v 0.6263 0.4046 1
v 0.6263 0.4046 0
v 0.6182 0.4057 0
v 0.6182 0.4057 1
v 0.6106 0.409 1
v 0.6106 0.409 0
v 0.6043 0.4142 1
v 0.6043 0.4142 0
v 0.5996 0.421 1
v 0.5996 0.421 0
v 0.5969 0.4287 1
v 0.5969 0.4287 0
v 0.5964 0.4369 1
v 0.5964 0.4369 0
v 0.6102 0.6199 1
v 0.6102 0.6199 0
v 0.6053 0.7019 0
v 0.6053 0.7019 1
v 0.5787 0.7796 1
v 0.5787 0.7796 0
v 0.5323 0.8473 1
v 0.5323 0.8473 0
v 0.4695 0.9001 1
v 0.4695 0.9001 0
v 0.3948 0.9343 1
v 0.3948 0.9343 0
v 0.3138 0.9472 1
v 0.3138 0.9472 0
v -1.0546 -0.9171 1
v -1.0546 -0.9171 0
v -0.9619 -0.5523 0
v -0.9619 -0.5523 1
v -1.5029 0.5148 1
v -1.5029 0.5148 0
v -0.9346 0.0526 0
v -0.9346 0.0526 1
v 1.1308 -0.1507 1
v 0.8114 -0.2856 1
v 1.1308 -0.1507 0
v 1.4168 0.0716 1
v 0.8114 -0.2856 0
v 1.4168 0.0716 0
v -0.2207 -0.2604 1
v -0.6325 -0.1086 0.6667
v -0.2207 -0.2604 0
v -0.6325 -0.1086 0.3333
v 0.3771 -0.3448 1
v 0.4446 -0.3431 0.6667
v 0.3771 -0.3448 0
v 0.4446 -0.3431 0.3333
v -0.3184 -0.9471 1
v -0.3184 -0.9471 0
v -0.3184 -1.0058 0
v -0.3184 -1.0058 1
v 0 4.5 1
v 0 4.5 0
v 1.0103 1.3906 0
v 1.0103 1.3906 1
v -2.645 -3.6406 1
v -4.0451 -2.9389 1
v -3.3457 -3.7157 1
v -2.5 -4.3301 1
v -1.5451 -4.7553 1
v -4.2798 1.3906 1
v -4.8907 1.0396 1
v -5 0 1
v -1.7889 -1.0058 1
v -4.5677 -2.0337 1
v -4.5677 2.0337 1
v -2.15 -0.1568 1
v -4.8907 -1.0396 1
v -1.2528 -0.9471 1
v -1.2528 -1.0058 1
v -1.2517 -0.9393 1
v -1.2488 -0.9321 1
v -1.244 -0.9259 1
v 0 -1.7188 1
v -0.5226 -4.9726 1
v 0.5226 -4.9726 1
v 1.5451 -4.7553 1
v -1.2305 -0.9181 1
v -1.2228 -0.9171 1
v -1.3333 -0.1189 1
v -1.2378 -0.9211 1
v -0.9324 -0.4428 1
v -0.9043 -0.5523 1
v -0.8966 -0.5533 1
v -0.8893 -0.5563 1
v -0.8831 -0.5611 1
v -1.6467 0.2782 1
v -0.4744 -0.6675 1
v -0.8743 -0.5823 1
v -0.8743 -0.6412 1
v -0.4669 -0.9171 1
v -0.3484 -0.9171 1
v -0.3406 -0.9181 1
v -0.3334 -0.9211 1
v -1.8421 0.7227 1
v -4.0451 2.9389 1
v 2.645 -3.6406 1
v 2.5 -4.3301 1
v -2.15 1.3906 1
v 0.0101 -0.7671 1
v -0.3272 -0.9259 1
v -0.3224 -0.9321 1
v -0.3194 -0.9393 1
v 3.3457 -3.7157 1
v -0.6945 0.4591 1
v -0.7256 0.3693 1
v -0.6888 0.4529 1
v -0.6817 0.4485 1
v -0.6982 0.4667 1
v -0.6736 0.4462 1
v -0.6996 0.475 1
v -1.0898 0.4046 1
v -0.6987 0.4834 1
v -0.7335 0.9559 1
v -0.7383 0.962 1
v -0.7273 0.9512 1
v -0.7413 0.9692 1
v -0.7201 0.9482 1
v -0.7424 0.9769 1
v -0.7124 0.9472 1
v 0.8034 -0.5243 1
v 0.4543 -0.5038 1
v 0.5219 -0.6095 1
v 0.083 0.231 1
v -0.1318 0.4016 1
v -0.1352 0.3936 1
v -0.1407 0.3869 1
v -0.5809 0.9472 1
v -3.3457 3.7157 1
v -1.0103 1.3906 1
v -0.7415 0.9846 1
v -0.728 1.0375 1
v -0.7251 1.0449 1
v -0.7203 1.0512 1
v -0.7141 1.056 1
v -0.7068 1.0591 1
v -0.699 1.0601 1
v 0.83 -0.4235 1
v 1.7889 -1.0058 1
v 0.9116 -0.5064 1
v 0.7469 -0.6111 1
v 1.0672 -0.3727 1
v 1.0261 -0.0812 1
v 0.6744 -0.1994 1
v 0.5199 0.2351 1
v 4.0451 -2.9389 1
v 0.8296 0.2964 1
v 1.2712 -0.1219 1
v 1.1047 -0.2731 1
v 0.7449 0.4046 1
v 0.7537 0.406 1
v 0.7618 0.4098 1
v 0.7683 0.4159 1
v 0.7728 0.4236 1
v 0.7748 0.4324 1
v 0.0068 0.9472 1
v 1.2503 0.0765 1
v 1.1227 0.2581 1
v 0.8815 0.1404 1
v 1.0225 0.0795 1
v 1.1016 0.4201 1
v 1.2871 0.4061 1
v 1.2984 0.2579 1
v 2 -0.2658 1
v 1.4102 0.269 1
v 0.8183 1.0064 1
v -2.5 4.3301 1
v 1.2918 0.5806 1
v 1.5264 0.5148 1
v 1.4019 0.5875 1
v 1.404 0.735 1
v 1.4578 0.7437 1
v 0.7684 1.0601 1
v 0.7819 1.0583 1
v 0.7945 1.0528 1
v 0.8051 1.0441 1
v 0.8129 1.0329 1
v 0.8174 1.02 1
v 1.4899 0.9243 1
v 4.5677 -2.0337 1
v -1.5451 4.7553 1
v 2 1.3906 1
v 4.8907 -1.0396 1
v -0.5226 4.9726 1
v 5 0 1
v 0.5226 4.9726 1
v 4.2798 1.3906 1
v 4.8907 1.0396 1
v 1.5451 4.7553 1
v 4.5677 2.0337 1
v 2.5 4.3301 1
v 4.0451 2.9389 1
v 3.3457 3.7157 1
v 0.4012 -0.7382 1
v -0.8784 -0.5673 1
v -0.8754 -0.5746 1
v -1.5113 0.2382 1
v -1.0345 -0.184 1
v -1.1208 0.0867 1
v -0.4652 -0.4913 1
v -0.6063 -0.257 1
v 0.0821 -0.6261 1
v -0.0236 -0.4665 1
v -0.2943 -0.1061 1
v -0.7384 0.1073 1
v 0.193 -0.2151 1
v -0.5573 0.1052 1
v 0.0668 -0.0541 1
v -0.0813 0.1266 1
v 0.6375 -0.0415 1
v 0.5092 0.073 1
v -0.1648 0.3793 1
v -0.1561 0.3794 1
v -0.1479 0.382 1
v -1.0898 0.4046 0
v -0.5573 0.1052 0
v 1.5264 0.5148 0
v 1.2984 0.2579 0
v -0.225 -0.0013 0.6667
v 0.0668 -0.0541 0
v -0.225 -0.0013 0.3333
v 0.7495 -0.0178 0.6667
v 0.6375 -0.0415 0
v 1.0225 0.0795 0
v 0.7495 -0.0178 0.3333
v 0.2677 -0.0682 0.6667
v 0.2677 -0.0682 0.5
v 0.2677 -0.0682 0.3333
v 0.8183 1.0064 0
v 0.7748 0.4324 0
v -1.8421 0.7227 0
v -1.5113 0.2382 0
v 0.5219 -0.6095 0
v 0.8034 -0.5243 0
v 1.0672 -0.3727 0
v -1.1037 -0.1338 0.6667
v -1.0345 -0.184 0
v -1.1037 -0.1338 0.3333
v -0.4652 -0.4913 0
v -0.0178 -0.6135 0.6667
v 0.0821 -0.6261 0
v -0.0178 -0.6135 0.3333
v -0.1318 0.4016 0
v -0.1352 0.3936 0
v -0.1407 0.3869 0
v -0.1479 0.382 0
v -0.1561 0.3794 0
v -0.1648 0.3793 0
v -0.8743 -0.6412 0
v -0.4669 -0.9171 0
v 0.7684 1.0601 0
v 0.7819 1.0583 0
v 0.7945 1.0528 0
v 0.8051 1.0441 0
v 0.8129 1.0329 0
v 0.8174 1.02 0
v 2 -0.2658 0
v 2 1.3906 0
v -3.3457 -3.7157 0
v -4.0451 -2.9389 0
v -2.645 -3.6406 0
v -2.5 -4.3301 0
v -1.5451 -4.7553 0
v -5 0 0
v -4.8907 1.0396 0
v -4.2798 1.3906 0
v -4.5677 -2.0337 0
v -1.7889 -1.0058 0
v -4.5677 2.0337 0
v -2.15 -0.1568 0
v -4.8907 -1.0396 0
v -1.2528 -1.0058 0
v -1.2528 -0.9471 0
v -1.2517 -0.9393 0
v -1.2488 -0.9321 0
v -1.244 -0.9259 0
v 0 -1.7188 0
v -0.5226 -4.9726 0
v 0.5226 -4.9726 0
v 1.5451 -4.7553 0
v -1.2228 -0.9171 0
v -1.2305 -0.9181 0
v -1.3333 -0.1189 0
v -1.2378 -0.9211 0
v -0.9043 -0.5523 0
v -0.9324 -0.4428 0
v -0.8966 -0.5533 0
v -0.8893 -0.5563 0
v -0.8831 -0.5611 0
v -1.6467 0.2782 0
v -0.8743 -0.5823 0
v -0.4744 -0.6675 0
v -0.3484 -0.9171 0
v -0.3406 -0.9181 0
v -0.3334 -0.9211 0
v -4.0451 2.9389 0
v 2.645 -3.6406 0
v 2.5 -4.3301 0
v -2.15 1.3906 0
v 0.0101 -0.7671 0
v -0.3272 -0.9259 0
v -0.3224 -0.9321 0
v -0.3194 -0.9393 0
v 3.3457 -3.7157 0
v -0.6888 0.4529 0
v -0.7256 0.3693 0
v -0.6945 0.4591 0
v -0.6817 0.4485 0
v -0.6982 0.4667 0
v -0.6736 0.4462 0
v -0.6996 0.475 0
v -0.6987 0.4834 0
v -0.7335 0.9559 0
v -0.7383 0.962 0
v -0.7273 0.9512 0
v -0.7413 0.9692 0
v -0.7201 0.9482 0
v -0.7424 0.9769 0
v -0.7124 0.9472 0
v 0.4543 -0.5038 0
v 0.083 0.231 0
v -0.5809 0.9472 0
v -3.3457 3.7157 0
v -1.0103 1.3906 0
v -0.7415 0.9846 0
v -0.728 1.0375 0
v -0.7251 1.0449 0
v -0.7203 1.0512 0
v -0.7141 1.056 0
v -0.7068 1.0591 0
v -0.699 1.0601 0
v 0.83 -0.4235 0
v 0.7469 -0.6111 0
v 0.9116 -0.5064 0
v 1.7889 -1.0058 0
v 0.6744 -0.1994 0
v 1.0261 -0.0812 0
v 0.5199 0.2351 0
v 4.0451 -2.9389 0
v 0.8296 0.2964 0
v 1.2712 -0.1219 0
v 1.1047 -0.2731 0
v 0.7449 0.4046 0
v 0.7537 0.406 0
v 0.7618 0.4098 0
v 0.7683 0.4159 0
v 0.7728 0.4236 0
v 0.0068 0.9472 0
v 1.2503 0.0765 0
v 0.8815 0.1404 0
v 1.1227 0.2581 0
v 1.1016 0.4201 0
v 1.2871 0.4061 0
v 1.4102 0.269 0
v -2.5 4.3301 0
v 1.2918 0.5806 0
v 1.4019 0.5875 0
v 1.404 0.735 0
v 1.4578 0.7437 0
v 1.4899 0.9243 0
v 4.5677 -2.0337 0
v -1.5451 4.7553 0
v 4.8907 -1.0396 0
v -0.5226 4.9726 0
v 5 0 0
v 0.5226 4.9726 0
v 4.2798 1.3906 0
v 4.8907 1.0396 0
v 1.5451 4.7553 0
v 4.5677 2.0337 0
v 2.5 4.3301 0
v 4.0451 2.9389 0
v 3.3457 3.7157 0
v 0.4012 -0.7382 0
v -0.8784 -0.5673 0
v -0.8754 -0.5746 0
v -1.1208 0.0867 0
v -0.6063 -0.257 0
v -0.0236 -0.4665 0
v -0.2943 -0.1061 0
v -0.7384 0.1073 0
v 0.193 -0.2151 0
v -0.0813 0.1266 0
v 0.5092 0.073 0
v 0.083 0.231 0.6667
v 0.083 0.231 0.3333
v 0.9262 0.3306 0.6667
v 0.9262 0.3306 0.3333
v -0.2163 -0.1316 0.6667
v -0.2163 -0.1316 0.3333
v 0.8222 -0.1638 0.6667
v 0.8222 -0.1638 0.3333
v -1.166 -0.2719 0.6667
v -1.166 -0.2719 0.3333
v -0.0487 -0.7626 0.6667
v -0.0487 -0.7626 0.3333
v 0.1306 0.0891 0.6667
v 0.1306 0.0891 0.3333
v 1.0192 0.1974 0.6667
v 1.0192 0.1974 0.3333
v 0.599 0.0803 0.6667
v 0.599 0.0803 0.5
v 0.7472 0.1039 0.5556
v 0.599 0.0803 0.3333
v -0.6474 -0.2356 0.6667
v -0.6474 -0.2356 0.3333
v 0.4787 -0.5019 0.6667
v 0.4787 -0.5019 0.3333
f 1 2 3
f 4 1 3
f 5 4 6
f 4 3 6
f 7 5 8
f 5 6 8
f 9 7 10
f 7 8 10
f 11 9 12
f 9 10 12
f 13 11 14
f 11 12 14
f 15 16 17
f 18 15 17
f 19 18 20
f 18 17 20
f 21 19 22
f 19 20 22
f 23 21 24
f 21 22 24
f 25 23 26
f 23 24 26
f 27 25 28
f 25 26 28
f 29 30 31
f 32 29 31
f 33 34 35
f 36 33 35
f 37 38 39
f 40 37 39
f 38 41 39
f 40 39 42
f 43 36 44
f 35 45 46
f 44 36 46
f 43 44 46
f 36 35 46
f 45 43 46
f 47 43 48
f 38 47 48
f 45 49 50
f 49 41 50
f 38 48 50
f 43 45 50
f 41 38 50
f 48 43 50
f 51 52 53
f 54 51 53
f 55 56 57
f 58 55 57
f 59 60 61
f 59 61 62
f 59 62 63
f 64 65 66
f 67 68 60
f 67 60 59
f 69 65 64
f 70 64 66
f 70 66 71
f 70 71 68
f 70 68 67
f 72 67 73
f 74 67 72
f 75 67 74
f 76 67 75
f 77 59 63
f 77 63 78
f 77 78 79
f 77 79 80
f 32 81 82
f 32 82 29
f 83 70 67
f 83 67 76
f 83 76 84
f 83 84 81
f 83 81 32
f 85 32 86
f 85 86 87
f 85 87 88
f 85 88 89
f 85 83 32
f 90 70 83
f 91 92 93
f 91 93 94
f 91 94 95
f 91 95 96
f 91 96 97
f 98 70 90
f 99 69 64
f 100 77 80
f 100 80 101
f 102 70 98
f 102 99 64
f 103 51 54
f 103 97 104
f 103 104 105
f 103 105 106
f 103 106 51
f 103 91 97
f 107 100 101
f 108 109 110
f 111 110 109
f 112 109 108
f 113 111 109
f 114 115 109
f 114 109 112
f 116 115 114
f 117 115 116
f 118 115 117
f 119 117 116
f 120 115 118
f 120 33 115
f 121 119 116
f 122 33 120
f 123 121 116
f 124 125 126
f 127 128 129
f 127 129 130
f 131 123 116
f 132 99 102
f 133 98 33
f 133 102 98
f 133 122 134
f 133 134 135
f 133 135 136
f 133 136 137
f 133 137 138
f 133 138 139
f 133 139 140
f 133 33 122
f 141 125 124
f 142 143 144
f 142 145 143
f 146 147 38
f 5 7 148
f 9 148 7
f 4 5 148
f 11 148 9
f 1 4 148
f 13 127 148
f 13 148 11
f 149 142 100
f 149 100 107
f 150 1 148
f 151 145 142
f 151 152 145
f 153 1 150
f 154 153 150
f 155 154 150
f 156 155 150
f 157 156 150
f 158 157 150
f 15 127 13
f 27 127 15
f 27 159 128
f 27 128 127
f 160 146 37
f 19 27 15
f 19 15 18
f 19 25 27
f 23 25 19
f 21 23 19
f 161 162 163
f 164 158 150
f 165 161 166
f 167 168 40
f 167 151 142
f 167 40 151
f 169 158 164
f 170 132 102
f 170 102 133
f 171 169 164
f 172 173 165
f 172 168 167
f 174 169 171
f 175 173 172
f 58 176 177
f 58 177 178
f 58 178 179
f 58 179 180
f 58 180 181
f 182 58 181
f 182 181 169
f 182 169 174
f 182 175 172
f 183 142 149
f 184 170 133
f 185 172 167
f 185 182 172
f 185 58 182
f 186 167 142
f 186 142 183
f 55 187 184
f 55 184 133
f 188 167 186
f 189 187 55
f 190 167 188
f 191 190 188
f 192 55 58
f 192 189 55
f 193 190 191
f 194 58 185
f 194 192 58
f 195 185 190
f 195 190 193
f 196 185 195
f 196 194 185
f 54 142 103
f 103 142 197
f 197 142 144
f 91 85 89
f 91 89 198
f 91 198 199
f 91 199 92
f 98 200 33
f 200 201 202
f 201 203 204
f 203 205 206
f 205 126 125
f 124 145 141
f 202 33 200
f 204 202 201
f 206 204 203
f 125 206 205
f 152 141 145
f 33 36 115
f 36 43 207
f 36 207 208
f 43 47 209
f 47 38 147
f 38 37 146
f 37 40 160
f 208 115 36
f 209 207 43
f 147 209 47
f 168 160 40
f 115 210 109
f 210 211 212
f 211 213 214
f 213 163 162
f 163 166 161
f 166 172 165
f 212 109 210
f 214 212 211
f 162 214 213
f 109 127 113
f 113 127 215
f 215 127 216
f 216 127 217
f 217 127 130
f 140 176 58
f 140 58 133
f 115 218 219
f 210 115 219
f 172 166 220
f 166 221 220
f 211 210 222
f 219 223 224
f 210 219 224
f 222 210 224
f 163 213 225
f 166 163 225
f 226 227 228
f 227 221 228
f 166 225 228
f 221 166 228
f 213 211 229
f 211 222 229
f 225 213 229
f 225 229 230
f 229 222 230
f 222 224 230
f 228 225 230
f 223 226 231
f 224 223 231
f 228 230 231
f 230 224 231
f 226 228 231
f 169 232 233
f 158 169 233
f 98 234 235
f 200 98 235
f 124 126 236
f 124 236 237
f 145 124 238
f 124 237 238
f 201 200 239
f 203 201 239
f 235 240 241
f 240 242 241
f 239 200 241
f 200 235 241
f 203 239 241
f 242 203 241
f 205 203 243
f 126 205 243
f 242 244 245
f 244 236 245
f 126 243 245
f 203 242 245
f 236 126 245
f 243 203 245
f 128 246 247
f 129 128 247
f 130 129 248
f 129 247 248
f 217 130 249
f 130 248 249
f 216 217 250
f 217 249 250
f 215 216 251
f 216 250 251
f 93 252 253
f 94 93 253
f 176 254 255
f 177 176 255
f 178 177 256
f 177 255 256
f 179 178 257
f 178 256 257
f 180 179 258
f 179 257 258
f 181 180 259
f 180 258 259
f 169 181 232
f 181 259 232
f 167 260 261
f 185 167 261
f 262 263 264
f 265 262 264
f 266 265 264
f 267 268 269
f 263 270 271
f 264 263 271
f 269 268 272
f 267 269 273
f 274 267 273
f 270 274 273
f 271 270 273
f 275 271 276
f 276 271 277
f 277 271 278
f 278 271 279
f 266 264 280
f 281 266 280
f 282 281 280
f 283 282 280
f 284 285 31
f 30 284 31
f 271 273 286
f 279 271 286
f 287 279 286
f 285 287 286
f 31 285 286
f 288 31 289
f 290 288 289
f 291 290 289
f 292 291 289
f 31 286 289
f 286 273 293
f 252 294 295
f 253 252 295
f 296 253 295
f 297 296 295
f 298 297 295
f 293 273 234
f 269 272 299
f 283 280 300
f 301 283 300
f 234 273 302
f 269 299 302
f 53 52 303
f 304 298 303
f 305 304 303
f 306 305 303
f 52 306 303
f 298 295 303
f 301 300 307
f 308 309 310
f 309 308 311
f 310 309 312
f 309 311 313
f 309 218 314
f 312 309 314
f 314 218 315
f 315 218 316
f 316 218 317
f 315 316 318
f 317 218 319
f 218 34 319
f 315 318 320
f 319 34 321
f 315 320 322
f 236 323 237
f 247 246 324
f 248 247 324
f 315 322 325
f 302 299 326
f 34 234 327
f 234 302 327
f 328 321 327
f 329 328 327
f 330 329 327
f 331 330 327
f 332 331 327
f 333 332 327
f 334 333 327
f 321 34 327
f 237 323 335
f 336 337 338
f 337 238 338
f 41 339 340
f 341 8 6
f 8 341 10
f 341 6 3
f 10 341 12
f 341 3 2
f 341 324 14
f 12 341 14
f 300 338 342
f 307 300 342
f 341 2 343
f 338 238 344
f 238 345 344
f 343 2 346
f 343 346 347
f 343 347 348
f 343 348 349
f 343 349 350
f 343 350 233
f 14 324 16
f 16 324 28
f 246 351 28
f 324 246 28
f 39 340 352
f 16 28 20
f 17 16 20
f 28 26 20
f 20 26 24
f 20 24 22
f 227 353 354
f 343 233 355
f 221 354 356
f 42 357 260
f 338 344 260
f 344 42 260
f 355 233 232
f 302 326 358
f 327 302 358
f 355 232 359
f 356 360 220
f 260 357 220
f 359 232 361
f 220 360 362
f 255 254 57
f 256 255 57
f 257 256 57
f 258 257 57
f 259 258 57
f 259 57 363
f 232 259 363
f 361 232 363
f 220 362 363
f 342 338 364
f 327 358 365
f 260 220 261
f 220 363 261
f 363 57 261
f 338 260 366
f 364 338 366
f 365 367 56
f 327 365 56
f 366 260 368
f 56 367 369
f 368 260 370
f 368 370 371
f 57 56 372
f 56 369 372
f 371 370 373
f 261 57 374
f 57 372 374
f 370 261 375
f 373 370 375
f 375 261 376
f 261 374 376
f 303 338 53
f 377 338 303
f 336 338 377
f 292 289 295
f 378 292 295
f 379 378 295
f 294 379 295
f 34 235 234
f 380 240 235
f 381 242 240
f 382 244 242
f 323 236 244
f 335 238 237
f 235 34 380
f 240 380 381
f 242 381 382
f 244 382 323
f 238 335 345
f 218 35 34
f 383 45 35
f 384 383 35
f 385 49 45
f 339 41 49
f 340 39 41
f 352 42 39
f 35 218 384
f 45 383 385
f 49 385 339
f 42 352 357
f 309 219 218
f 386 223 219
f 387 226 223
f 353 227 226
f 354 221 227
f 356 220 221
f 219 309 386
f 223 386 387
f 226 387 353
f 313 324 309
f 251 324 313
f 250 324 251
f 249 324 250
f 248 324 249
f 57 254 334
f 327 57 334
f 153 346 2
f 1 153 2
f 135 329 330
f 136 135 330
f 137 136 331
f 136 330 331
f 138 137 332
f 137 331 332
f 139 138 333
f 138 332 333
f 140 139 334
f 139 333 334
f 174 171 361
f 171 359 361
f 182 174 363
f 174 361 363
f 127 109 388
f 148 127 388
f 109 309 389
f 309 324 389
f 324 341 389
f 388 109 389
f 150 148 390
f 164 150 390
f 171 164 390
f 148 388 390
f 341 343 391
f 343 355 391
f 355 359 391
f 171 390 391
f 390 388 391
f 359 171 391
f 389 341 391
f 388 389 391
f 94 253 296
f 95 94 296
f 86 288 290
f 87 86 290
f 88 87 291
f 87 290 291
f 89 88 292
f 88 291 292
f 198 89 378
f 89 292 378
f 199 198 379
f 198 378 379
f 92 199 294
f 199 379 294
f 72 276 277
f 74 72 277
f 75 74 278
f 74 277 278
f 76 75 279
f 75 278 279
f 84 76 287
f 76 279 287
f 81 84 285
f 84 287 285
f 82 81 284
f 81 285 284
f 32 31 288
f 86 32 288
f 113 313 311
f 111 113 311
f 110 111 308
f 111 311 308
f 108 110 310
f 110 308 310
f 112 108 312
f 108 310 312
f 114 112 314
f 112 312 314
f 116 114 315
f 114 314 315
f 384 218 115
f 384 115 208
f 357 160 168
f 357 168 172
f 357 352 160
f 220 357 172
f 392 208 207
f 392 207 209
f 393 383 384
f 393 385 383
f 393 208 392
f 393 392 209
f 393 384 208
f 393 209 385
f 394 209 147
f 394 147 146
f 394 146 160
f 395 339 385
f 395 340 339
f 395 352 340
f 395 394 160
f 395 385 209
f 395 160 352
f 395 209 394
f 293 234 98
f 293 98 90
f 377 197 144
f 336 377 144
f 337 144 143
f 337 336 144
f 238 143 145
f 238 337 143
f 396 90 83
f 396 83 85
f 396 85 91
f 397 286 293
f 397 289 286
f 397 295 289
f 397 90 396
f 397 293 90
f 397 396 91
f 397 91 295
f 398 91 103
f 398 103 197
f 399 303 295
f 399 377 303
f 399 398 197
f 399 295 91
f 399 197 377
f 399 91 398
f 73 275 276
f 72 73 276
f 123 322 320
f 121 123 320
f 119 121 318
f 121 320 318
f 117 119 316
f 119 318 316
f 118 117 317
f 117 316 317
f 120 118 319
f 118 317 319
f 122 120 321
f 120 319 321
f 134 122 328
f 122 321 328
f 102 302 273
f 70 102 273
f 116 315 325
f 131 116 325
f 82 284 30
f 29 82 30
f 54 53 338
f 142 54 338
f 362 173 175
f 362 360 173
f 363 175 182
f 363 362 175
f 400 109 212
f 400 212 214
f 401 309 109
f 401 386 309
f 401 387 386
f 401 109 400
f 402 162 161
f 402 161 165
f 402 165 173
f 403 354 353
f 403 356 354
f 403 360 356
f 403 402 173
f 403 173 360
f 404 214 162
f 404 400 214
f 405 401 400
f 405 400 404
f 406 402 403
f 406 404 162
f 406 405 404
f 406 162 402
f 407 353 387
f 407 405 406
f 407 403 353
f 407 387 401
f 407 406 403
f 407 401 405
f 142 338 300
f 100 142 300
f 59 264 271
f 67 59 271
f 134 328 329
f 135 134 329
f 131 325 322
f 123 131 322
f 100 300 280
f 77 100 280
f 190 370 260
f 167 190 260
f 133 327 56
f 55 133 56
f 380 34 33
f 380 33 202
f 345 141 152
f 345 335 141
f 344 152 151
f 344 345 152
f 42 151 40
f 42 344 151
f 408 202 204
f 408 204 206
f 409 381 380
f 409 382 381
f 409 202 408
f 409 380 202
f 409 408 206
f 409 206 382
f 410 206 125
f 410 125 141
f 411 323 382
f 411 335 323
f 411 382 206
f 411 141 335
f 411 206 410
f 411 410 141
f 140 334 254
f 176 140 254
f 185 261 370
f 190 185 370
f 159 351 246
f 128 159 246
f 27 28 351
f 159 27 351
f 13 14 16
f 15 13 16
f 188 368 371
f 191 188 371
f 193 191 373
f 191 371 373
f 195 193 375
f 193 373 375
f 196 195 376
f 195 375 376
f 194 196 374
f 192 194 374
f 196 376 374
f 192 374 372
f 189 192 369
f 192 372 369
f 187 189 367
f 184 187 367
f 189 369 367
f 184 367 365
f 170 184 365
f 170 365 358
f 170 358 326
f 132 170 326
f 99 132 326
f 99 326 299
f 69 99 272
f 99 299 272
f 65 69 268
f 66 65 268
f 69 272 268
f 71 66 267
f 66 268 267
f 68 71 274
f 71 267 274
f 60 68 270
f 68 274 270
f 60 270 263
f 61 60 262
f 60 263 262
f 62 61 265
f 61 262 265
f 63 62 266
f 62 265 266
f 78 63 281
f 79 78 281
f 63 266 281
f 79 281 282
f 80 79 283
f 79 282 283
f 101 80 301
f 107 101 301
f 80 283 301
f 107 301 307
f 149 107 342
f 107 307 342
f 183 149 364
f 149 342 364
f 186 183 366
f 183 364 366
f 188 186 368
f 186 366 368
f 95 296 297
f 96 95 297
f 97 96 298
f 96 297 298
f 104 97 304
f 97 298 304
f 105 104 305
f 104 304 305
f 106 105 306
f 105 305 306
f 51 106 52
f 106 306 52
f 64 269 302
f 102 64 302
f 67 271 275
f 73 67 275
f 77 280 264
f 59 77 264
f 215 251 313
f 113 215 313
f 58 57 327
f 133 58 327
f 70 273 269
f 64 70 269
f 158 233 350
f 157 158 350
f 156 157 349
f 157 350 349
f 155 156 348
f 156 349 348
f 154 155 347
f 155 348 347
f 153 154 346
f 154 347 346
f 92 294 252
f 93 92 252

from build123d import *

# Parameters (mm, degrees)
SKETCH_1_R      = 5
EXTRUDE_1_DEPTH = 1


with BuildPart() as part:
    # 草图1 → 凸台-拉伸1 (new body)
    with BuildSketch(Plane.XY):
        Circle(SKETCH_1_R)
        with BuildLine():
            Line((-0.318380039, -1.005793851), (1.720384349, -1.005793851))
            Line((1.720384349, -1.005793851), (1.788940866, -1.005793851))
            Line((1.788940866, -1.005793851), (2.645033635, -3.640576475))
            Line((2.645033635, -3.640576475), (0, -1.718847051))
            Line((0, -1.718847051), (-2.645033635, -3.640576475))
            Line((-2.645033635, -3.640576475), (-1.788940866, -1.005793851))
            Line((-1.788940866, -1.005793851), (-1.252770646, -1.005793851))
            Line((-1.252770646, -1.005793851), (-1.252770646, -0.94707964))
            ThreePointArc((-1.252770646, -0.94707964), (-1.24398385, -0.925866437), (-1.222770646, -0.91707964))
            Line((-1.222770646, -0.91707964), (-1.054612311, -0.91707964))
            Line((-1.054612311, -0.91707964), (-0.9619207, -0.552326205))
            Line((-0.9619207, -0.552326205), (-0.904349803, -0.552326205))
            ThreePointArc((-0.904349803, -0.552326205), (-0.8831366, -0.561113001), (-0.874349803, -0.582326205))
            Line((-0.874349803, -0.582326205), (-0.874349803, -0.641189165))
            Line((-0.874349803, -0.641189165), (-0.466949327, -0.91707964))
            Line((-0.466949327, -0.91707964), (-0.348380039, -0.91707964))
            ThreePointArc((-0.348380039, -0.91707964), (-0.327166836, -0.925866437), (-0.318380039, -0.94707964))
            Line((-0.318380039, -0.94707964), (-0.318380039, -1.005793851))
        make_face(mode=Mode.SUBTRACT)
        with BuildLine():
            add(Edge.make_bspline(
                [(-1.842127605, 0.722748563), (-1.53406941, -0.398381027), (0.099478664, -1.328305568), (1.067230007, -0.372749727)],
                knots=[0, 0, 0, 0, 1, 1, 1, 1], degree=3))
            add(Edge.make_bspline(
                [(-1.842127605, 0.722748563), (-1.393572664, -0.207863674), (0.098677528, -1.088124965), (1.067230007, -0.372749727)],
                knots=[0, 0, 0, 0, 1, 1, 1, 1], degree=3))
        make_face(mode=Mode.SUBTRACT)
        with BuildLine():
            add(Edge.make_bspline(
                [(-1.502914254, 0.514806758), (-0.935681631, -0.359051857), (0.725669726, -1.040375739), (1.416769627, 0.071599659)],
                knots=[0, 0, 0, 0, 1, 1, 1, 1], degree=3))
            add(Edge.make_bspline(
                [(-1.502914254, 0.514806758), (-0.839650751, -0.216239781), (0.600989178, -0.75455265), (1.416769627, 0.071599659)],
                knots=[0, 0, 0, 0, 1, 1, 1, 1], degree=3))
        make_face(mode=Mode.SUBTRACT)
        with BuildLine():
            add(Edge.make_bspline(
                [(-1.089784914, 0.404626073), (-0.465343338, -0.314626601), (1.155887368, -0.588128356), (1.526429115, 0.514806758)],
                knots=[0, 0, 0, 0, 1, 1, 1, 1], degree=3))
            add(Edge.make_bspline(
                [(-1.089784914, 0.404626073), (-0.382266231, -0.142810276), (0.950686118, -0.345522278), (1.526429115, 0.514806758)],
                knots=[0, 0, 0, 0, 1, 1, 1, 1], degree=3))
        make_face(mode=Mode.SUBTRACT)
        Polygon((-4.279754323, 1.390576475), (-2.15, 1.390576475), (-2.15, -0.066596805), (-2.15, -0.156780615), align=None, mode=Mode.SUBTRACT)
        Polygon((-1.010312947, 1.390576475), (0, 4.5), (1.010312947, 1.390576475), align=None, mode=Mode.SUBTRACT)
        with BuildLine():
            add(Edge.make_bspline(
                [(-0.725576796, 0.369276137), (-0.035664287, -0.02834489), (1.378252258, -0.188638059), (1.489870248, 0.924289378)],
                knots=[0, 0, 0, 0, 1, 1, 1, 1], degree=3))
            add(Edge.make_bspline(
                [(-0.725576796, 0.369276137), (-0.039042271, 0.197569955), (1.170700763, -0.001897128), (1.489870248, 0.924289378)],
                knots=[0, 0, 0, 0, 1, 1, 1, 1], degree=3))
        make_face(mode=Mode.SUBTRACT)
        with BuildLine():
            ThreePointArc((-0.712399817, 0.947220378), (-0.736081707, 0.958803862), (-0.741475678, 0.984609173))
            Line((-0.741475678, 0.984609173), (-0.7280269, 1.03753185))
            ThreePointArc((-0.7280269, 1.03753185), (-0.717367555, 1.053824945), (-0.698951039, 1.060143055))
            Line((-0.698951039, 1.060143055), (0.76839361, 1.060143055))
            ThreePointArc((0.76839361, 1.060143055), (0.805059277, 1.044137597), (0.818250912, 1.00636821))
            Line((0.818250912, 1.00636821), (0.774791122, 0.432361166))
            ThreePointArc((0.774791122, 0.432361166), (0.765273466, 0.412626673), (0.744876741, 0.404626073))
            Line((0.744876741, 0.404626073), (0.626290225, 0.404626073))
            ThreePointArc((0.626290225, 0.404626073), (0.604290825, 0.414229348), (0.596375844, 0.43689098))
            Line((0.596375844, 0.43689098), (0.610235616, 0.61994771))
            ThreePointArc((0.610235616, 0.61994771), (0.53231079, 0.847272593), (0.313771729, 0.947220378))
            Line((0.313771729, 0.947220378), (0.006808985, 0.947220378))
            Line((0.006808985, 0.947220378), (-0.131834864, 0.401638961))
            ThreePointArc((-0.131834864, 0.401638961), (-0.144081452, 0.38419279), (-0.164823975, 0.379284077))
            Line((-0.164823975, 0.379284077), (-0.673570673, 0.446217721))
            ThreePointArc((-0.673570673, 0.446217721), (-0.694492389, 0.459132127), (-0.698733285, 0.483350196))
            Line((-0.698733285, 0.483350196), (-0.580853999, 0.947220378))
            Line((-0.580853999, 0.947220378), (-0.712399817, 0.947220378))
        make_face(mode=Mode.SUBTRACT)
        Polygon((4.279754323, 1.390576475), (2, -0.265761995), (2, -0.022653284), (2, 1.390576475), align=None, mode=Mode.SUBTRACT)
    extrude(amount=EXTRUDE_1_DEPTH)


solid = part.part
